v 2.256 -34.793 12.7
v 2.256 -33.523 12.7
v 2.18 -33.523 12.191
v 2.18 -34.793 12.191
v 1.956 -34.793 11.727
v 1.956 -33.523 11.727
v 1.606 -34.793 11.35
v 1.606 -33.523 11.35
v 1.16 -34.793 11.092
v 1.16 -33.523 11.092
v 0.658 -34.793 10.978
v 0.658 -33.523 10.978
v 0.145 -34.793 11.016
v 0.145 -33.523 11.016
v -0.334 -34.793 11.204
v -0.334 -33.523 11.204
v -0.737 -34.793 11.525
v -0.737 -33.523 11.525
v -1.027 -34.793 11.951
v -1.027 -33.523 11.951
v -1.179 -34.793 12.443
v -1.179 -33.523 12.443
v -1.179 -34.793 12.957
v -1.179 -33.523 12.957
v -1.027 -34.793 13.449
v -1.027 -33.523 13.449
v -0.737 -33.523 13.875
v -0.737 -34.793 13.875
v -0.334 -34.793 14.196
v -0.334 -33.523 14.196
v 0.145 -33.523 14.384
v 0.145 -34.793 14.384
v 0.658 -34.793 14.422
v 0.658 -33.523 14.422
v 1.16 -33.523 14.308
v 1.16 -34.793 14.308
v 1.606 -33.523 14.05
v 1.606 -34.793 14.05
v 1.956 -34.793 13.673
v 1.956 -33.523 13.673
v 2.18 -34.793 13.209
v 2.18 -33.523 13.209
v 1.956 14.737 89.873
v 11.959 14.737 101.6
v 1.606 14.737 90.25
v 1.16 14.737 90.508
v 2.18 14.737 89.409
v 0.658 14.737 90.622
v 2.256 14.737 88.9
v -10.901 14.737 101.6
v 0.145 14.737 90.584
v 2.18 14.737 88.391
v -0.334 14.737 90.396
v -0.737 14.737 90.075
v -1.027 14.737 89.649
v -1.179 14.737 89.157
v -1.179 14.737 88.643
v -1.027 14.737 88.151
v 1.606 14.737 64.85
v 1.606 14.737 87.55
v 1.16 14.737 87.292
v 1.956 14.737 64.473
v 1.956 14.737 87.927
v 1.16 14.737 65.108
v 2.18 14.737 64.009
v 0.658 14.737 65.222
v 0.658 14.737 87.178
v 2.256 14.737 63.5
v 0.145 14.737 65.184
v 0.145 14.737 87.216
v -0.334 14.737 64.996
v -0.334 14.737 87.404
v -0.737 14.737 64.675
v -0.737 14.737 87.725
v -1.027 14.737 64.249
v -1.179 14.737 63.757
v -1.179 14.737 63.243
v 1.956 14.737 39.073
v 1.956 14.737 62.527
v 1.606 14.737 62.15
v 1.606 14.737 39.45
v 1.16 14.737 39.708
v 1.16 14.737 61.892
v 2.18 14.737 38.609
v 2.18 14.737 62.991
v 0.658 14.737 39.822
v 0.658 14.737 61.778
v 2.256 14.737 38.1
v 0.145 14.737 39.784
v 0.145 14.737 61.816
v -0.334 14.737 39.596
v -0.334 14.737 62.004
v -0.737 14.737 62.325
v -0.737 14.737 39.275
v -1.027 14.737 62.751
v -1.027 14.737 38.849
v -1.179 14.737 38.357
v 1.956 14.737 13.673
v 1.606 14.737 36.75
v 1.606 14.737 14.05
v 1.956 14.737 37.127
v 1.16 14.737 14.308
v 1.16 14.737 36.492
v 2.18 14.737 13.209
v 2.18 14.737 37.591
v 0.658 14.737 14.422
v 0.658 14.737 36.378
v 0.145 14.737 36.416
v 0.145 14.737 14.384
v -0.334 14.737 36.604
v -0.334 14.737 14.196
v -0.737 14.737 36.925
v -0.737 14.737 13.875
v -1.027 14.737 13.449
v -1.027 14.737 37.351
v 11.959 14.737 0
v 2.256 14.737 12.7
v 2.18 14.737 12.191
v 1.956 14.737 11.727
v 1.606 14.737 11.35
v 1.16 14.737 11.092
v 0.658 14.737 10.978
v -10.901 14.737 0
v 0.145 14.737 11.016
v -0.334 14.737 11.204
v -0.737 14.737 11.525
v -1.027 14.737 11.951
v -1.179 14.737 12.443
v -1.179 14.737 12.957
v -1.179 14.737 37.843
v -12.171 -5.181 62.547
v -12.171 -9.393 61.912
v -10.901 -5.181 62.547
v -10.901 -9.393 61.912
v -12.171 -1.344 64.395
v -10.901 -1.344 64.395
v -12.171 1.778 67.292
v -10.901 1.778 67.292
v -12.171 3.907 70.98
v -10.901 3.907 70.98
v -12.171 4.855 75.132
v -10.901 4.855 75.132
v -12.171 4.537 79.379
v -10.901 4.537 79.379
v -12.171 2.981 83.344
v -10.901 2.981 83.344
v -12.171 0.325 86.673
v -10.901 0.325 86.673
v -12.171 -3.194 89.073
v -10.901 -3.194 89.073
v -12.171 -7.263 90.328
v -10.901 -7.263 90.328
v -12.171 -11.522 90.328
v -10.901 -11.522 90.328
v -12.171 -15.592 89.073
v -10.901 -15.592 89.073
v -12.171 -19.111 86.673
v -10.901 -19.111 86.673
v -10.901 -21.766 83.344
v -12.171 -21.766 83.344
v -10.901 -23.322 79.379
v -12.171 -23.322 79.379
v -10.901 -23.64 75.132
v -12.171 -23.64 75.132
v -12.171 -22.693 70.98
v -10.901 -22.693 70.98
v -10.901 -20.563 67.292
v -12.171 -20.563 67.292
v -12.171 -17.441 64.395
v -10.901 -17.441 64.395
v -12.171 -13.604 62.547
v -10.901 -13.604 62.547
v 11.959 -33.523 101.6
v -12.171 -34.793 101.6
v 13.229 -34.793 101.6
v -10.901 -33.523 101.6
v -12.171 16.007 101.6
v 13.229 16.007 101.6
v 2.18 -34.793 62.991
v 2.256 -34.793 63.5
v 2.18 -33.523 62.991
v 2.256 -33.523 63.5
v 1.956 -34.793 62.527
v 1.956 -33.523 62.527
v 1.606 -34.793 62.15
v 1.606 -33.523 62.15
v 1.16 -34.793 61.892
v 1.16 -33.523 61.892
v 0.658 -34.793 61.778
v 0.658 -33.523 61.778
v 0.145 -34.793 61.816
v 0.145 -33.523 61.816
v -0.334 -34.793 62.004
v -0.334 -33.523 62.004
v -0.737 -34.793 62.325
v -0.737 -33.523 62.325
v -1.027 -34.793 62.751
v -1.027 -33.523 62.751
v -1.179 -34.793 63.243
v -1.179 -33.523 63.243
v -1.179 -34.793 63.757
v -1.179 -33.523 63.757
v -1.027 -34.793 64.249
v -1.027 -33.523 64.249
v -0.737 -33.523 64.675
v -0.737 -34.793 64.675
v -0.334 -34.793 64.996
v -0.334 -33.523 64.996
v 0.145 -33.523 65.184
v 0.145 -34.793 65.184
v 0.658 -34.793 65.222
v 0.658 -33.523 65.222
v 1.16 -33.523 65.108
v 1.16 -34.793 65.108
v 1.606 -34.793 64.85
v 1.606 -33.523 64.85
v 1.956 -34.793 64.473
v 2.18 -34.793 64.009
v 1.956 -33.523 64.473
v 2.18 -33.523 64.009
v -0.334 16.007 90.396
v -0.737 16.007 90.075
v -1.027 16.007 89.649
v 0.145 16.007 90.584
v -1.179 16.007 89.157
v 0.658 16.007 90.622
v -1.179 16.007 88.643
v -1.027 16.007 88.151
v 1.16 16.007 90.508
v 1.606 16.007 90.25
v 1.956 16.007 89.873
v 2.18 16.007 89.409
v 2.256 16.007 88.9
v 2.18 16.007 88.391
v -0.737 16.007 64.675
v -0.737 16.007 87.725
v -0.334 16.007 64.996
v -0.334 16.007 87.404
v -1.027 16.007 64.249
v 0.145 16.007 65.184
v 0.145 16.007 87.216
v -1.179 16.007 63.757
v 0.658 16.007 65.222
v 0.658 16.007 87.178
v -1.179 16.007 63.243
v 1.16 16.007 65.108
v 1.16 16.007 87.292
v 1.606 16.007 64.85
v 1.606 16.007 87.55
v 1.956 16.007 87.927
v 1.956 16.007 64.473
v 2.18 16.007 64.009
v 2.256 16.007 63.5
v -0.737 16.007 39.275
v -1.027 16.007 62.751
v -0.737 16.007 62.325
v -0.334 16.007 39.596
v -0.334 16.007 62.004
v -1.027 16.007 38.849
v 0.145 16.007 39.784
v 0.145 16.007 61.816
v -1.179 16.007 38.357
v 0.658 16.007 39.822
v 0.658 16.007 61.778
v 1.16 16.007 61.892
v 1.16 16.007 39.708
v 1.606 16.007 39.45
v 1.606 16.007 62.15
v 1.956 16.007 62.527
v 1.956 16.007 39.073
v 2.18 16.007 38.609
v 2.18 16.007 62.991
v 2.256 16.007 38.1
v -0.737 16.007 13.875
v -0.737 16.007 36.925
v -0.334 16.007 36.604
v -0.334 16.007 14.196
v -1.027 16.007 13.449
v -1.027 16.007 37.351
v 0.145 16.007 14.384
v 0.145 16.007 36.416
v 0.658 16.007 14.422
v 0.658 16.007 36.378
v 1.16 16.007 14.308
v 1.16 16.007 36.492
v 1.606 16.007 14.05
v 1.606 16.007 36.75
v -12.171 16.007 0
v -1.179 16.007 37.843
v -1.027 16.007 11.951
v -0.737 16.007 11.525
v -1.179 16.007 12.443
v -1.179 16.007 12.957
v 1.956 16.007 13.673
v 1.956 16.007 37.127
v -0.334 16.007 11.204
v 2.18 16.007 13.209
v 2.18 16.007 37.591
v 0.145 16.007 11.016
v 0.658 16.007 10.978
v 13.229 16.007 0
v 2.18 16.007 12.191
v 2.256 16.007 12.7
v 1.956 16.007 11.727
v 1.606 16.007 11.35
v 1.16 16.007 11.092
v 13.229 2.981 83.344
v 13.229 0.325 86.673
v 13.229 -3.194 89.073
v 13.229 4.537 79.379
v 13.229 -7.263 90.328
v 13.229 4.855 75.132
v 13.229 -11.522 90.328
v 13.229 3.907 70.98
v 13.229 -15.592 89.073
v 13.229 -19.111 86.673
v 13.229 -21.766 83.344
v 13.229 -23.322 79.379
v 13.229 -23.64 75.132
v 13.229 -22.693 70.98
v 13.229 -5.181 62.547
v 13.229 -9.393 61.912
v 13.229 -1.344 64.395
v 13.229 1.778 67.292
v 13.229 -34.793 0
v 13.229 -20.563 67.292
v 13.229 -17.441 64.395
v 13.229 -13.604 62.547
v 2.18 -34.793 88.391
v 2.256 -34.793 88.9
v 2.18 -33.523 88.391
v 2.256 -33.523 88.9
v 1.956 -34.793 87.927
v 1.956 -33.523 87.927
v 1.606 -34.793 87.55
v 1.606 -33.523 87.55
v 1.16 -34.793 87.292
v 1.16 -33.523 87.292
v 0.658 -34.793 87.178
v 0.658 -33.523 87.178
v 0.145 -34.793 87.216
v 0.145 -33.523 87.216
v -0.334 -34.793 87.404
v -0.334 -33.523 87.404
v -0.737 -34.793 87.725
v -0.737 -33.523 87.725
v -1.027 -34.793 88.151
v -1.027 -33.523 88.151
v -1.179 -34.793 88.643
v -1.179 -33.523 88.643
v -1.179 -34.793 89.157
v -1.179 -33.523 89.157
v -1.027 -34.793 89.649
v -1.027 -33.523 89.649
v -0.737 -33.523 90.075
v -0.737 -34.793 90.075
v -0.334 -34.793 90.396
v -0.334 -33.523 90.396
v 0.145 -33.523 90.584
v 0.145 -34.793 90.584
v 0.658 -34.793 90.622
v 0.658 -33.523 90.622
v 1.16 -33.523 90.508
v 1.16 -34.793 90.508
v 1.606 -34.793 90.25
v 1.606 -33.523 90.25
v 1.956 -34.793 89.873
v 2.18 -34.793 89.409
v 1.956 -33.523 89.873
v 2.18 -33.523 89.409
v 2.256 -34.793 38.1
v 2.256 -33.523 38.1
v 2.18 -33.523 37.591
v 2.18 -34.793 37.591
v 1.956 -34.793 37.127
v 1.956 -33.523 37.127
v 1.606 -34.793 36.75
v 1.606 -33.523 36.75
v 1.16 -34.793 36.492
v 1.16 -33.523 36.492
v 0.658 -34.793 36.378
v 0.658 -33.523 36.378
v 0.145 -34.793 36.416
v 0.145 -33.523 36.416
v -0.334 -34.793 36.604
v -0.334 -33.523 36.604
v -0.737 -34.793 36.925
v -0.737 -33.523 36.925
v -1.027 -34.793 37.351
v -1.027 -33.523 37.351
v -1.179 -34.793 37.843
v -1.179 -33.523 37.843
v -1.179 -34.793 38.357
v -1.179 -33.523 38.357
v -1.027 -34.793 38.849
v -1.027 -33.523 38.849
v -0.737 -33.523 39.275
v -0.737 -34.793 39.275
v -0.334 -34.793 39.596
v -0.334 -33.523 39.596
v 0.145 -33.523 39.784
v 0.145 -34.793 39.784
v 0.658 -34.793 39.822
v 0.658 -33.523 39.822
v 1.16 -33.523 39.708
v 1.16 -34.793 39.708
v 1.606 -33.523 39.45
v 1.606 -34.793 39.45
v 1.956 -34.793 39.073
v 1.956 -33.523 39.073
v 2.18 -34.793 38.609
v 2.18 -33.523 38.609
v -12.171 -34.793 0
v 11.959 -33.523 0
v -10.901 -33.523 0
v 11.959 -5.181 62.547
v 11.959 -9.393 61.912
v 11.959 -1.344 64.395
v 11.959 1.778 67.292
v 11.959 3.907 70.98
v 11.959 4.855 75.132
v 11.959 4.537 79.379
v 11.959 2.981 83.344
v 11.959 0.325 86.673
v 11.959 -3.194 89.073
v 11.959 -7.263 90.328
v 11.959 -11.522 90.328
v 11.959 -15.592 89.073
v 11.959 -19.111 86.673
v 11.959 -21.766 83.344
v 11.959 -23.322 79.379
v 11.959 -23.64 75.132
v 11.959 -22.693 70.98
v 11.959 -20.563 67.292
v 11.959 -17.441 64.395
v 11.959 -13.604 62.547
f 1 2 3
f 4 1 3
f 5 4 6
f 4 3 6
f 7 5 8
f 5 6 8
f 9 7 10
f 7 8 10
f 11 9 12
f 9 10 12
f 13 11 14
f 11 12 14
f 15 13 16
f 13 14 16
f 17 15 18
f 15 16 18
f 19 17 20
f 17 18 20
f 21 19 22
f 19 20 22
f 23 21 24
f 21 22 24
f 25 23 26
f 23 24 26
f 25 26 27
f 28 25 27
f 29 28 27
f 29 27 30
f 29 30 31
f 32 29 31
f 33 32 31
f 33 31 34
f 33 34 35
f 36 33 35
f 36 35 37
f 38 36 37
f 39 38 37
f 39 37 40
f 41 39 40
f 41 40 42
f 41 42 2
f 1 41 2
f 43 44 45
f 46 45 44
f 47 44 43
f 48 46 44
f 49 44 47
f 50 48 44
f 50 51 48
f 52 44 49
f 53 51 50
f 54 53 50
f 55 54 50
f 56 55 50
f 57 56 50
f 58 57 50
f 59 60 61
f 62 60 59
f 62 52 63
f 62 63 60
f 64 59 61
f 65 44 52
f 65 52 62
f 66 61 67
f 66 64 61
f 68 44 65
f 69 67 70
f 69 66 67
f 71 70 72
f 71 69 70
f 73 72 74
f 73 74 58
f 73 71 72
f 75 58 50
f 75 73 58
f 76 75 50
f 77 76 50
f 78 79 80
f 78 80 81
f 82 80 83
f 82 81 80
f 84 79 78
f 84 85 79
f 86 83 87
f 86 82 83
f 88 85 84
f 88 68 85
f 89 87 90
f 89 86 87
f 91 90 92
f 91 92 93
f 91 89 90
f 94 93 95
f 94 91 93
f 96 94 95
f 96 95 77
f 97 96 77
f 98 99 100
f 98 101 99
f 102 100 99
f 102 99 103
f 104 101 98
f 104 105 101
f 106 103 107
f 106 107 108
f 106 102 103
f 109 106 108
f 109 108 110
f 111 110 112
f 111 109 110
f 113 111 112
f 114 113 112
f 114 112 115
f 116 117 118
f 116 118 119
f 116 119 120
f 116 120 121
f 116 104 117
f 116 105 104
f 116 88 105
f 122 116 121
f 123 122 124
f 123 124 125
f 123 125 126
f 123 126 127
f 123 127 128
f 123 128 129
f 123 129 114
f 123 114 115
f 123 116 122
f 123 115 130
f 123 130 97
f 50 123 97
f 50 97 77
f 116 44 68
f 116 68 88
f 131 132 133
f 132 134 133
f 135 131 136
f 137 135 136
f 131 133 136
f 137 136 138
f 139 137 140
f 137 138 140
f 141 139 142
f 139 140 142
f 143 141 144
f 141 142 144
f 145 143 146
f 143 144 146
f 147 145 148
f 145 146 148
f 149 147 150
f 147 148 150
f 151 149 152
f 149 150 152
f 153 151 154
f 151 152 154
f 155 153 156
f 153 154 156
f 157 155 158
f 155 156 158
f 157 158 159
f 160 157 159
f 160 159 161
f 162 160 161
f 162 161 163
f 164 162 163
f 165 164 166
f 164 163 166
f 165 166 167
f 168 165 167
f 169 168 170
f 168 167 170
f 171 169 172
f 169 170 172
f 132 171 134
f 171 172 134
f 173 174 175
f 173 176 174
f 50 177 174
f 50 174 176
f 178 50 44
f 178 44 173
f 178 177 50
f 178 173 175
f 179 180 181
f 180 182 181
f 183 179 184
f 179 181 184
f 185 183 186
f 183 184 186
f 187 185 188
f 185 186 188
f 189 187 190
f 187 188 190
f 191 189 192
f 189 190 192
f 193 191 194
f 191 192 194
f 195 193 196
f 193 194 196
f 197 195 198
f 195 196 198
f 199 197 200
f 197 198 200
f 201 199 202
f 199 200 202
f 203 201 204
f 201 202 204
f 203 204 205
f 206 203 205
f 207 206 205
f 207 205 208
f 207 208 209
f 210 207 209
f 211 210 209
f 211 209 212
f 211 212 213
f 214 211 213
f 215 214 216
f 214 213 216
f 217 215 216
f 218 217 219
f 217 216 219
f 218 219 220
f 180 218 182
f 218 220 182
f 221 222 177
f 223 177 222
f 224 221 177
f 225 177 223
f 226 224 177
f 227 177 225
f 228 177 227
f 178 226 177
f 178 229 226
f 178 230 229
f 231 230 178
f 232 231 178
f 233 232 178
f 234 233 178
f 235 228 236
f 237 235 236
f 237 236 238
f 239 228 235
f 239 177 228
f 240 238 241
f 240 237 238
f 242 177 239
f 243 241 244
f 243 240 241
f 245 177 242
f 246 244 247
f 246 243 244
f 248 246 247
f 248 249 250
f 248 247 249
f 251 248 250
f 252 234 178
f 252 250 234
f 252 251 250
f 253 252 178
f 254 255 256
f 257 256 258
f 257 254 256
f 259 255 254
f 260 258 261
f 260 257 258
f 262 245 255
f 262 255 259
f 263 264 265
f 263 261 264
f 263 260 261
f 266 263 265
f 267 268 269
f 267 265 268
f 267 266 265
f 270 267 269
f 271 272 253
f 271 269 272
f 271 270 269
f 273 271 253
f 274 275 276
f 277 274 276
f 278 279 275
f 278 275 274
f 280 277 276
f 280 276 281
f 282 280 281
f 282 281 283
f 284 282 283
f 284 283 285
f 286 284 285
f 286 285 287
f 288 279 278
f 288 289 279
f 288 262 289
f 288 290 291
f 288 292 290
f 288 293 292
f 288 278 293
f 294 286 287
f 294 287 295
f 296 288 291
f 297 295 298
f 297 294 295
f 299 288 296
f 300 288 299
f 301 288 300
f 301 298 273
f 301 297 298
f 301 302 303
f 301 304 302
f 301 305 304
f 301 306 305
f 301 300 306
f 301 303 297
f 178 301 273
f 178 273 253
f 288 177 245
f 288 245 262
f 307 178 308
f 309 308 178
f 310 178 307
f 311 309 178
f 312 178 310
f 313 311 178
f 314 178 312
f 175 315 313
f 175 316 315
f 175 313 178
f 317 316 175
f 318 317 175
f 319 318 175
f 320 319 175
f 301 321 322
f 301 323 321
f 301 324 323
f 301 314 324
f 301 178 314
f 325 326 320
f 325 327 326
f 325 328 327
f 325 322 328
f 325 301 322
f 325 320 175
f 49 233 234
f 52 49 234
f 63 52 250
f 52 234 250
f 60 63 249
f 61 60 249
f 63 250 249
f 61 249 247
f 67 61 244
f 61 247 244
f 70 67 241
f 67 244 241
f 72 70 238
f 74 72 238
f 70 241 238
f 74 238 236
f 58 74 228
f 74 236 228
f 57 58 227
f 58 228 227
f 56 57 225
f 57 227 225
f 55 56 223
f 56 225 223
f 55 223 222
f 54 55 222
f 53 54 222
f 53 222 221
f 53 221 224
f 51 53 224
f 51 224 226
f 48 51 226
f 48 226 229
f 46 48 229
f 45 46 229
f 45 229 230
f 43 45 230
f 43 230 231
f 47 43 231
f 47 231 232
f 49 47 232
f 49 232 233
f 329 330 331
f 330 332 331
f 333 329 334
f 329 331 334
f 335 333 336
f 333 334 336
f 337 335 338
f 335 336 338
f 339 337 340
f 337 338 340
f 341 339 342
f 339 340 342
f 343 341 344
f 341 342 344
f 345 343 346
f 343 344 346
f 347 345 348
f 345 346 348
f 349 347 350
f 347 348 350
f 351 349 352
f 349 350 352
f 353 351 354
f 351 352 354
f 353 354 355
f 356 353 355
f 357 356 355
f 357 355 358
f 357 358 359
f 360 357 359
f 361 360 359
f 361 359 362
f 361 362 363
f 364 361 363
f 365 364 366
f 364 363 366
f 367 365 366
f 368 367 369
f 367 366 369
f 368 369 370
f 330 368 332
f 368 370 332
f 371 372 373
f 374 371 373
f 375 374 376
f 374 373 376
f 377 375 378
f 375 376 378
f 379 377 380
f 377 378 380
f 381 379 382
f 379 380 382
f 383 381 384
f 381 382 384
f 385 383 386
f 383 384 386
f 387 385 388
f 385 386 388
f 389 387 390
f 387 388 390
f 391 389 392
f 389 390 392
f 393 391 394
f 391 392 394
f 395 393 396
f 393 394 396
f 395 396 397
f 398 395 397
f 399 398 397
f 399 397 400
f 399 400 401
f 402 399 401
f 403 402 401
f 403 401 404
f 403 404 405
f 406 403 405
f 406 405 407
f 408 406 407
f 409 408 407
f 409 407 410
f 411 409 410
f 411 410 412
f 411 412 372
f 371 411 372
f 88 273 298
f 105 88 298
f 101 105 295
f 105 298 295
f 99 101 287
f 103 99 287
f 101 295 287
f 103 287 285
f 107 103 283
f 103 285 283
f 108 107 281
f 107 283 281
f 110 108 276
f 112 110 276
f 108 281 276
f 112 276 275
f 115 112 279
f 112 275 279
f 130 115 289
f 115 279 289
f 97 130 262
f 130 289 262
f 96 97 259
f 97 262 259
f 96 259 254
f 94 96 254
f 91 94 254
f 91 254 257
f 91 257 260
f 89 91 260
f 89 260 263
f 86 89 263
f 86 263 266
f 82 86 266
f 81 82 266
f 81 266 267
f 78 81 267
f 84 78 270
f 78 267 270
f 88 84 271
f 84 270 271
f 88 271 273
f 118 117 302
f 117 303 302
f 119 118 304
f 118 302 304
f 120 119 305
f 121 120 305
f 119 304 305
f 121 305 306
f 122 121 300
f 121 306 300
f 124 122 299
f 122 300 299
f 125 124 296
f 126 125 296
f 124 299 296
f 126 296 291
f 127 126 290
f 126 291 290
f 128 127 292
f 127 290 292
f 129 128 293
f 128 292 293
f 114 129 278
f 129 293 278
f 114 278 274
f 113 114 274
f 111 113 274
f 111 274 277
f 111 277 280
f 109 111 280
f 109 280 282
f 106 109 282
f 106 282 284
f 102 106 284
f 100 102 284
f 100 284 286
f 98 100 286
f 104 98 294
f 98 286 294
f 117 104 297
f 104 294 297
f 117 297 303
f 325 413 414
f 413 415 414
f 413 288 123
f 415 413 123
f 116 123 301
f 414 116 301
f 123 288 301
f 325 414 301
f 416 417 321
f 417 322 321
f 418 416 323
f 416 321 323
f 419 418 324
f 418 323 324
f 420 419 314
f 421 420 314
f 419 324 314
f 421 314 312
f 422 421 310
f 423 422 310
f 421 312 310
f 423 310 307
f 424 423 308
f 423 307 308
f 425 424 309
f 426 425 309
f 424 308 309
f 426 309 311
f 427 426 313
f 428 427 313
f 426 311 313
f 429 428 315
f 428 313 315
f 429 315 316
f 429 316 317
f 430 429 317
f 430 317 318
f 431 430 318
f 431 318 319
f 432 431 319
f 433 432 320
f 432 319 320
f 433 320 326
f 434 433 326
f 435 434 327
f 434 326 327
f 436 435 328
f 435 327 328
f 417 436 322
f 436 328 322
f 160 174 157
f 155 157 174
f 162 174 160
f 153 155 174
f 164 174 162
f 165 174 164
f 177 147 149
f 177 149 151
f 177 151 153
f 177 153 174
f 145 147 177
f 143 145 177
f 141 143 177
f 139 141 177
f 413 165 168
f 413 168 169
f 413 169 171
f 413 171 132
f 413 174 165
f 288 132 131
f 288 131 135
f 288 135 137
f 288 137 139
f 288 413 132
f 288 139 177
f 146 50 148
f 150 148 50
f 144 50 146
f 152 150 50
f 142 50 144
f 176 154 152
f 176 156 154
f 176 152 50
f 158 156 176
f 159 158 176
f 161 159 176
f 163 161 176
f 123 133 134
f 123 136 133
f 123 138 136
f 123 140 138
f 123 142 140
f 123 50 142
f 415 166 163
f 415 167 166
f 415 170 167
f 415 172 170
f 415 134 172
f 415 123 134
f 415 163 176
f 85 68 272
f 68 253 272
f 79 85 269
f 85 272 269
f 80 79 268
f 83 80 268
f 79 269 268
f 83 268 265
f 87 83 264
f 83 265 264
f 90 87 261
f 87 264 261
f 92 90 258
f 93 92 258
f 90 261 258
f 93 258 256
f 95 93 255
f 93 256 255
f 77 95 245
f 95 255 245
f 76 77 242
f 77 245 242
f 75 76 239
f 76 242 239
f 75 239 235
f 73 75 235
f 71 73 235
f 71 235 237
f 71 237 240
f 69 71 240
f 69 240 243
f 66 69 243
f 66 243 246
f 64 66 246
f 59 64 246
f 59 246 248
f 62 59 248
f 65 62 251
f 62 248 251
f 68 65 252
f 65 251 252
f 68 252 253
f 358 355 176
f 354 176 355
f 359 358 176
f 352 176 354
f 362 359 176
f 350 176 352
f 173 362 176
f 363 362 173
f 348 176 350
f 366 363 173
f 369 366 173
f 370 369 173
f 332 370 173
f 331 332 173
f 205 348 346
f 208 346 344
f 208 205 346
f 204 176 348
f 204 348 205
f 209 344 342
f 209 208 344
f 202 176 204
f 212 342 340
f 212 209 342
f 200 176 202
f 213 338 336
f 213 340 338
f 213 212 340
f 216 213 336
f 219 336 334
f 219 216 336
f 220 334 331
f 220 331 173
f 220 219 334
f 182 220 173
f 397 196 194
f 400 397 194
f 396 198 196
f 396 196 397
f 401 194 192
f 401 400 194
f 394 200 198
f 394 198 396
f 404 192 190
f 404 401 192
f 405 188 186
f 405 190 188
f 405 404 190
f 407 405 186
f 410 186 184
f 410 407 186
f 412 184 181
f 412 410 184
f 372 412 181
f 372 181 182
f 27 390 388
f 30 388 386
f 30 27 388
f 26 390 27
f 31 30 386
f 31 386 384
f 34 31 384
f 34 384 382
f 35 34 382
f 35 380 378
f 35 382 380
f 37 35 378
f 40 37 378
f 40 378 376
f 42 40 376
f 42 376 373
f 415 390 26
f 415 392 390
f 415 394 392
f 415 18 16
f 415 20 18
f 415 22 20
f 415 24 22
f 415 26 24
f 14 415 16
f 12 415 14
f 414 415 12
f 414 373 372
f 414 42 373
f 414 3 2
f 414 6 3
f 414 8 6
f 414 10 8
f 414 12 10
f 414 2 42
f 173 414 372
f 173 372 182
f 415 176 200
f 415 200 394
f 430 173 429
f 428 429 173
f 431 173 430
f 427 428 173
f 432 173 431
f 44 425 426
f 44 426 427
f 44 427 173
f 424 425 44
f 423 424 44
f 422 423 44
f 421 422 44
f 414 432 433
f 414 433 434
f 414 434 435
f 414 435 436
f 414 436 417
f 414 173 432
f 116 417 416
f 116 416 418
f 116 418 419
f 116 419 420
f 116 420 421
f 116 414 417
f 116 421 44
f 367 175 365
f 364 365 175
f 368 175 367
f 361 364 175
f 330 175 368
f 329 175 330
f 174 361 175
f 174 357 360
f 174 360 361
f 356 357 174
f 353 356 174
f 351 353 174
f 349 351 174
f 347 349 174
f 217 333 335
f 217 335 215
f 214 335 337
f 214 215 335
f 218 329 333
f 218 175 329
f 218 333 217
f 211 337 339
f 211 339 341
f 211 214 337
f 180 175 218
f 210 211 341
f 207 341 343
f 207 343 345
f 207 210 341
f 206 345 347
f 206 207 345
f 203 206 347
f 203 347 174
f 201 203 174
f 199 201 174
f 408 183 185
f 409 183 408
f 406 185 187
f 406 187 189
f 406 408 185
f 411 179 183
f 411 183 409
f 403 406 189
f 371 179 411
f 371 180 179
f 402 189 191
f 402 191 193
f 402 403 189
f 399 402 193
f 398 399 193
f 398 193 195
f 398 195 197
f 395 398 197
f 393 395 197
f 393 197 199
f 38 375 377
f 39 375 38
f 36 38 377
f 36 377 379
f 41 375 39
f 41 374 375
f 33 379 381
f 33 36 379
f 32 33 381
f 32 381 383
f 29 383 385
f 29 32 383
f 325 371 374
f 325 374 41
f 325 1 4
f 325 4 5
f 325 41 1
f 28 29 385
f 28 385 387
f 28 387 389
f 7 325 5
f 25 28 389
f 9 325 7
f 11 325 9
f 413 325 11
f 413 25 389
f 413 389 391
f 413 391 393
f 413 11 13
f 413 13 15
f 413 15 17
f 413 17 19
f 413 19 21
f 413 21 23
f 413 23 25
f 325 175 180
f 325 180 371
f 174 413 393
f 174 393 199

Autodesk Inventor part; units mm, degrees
ref_plane "YZ Plane" through (0, 0, 0) normal (1, 0, 0) x (0, 1, 0)
ref_plane "XZ Plane" through (0, 0, 0) normal (0, 1, 0) x (-1, 0, 0)
ref_plane "XY Plane" through (0, 0, 0) normal (0, 0, 1) x (1, 0, 0)
sketch "Sketch1" plane through (0, 0, 0) normal (0, 0, 1) x (1, 0, 0)
  line L0 (-12.1708, 16.0073) -> (13.2292, 16.0073)
  line L1 (13.2292, 16.0073) -> (13.2292, -34.7927)
  line L2 (13.2292, -34.7927) -> (-12.1708, -34.7927)
  line L3 (-12.1708, -34.7927) -> (-12.1708, 16.0073)
  line L4 (11.9592, 14.7373) -> (-10.9008, 14.7373)
  line L5 (-10.9008, 14.7373) -> (-10.9008, -33.5227)
  line L6 (-10.9008, -33.5227) -> (11.9592, -33.5227)
  line L7 (11.9592, -33.5227) -> (11.9592, 14.7373)
  point P0 (0, 0)
  dimension "d0" = 25.4
  dimension "d1" = 50.8
  dimension "d2" = 1.27
extrude "Extrusion1" add sketch "Sketch1" along normal blind 101.6
sketch "Sketch2" plane through (-12.1708, 16.0073, 0) normal (0, 1, 0) x (1, 0, 0)
  circle A0 centre (12.7, -12.7) radius 1.7272
  line L0 (25.4, 0) -> (0, 0) projected
  line L1 (0, 0) -> (0, -101.6) projected
  point P0 (12.1708, 0)
  dimension "d5" = 3.4544
  dimension "d6" = 12.7
  dimension "d7" = 12.7
extrude "Extrusion2" cut sketch "Sketch2" against normal through all
pattern_linear "Rectangular Pattern1" count 10 spacing 25.4 along (0, 0, 1) of "Extrusion2"
sketch "Sketch4" plane through (13.2292, -34.7927, 0) normal (1, 0, 0) x (0, 0, -1)
  circle A0 centre (-76.2, 25.4) radius 14.2875
  line L0 (-101.6, 0) -> (-101.6, 50.8) projected
  point P0 (0, 34.7927)
  dimension "d19" = 28.575
  dimension "d20" = 25.4
extrude "Extrusion4" cut sketch "Sketch4" against normal through all
equation "\"d3\" = d13"
equation "\"d10\" = d14"
equation "\"d13\" = 101.6"
equation "\"d14\" = d13"
properties part number "Elevator VersaframeBacktrack"
